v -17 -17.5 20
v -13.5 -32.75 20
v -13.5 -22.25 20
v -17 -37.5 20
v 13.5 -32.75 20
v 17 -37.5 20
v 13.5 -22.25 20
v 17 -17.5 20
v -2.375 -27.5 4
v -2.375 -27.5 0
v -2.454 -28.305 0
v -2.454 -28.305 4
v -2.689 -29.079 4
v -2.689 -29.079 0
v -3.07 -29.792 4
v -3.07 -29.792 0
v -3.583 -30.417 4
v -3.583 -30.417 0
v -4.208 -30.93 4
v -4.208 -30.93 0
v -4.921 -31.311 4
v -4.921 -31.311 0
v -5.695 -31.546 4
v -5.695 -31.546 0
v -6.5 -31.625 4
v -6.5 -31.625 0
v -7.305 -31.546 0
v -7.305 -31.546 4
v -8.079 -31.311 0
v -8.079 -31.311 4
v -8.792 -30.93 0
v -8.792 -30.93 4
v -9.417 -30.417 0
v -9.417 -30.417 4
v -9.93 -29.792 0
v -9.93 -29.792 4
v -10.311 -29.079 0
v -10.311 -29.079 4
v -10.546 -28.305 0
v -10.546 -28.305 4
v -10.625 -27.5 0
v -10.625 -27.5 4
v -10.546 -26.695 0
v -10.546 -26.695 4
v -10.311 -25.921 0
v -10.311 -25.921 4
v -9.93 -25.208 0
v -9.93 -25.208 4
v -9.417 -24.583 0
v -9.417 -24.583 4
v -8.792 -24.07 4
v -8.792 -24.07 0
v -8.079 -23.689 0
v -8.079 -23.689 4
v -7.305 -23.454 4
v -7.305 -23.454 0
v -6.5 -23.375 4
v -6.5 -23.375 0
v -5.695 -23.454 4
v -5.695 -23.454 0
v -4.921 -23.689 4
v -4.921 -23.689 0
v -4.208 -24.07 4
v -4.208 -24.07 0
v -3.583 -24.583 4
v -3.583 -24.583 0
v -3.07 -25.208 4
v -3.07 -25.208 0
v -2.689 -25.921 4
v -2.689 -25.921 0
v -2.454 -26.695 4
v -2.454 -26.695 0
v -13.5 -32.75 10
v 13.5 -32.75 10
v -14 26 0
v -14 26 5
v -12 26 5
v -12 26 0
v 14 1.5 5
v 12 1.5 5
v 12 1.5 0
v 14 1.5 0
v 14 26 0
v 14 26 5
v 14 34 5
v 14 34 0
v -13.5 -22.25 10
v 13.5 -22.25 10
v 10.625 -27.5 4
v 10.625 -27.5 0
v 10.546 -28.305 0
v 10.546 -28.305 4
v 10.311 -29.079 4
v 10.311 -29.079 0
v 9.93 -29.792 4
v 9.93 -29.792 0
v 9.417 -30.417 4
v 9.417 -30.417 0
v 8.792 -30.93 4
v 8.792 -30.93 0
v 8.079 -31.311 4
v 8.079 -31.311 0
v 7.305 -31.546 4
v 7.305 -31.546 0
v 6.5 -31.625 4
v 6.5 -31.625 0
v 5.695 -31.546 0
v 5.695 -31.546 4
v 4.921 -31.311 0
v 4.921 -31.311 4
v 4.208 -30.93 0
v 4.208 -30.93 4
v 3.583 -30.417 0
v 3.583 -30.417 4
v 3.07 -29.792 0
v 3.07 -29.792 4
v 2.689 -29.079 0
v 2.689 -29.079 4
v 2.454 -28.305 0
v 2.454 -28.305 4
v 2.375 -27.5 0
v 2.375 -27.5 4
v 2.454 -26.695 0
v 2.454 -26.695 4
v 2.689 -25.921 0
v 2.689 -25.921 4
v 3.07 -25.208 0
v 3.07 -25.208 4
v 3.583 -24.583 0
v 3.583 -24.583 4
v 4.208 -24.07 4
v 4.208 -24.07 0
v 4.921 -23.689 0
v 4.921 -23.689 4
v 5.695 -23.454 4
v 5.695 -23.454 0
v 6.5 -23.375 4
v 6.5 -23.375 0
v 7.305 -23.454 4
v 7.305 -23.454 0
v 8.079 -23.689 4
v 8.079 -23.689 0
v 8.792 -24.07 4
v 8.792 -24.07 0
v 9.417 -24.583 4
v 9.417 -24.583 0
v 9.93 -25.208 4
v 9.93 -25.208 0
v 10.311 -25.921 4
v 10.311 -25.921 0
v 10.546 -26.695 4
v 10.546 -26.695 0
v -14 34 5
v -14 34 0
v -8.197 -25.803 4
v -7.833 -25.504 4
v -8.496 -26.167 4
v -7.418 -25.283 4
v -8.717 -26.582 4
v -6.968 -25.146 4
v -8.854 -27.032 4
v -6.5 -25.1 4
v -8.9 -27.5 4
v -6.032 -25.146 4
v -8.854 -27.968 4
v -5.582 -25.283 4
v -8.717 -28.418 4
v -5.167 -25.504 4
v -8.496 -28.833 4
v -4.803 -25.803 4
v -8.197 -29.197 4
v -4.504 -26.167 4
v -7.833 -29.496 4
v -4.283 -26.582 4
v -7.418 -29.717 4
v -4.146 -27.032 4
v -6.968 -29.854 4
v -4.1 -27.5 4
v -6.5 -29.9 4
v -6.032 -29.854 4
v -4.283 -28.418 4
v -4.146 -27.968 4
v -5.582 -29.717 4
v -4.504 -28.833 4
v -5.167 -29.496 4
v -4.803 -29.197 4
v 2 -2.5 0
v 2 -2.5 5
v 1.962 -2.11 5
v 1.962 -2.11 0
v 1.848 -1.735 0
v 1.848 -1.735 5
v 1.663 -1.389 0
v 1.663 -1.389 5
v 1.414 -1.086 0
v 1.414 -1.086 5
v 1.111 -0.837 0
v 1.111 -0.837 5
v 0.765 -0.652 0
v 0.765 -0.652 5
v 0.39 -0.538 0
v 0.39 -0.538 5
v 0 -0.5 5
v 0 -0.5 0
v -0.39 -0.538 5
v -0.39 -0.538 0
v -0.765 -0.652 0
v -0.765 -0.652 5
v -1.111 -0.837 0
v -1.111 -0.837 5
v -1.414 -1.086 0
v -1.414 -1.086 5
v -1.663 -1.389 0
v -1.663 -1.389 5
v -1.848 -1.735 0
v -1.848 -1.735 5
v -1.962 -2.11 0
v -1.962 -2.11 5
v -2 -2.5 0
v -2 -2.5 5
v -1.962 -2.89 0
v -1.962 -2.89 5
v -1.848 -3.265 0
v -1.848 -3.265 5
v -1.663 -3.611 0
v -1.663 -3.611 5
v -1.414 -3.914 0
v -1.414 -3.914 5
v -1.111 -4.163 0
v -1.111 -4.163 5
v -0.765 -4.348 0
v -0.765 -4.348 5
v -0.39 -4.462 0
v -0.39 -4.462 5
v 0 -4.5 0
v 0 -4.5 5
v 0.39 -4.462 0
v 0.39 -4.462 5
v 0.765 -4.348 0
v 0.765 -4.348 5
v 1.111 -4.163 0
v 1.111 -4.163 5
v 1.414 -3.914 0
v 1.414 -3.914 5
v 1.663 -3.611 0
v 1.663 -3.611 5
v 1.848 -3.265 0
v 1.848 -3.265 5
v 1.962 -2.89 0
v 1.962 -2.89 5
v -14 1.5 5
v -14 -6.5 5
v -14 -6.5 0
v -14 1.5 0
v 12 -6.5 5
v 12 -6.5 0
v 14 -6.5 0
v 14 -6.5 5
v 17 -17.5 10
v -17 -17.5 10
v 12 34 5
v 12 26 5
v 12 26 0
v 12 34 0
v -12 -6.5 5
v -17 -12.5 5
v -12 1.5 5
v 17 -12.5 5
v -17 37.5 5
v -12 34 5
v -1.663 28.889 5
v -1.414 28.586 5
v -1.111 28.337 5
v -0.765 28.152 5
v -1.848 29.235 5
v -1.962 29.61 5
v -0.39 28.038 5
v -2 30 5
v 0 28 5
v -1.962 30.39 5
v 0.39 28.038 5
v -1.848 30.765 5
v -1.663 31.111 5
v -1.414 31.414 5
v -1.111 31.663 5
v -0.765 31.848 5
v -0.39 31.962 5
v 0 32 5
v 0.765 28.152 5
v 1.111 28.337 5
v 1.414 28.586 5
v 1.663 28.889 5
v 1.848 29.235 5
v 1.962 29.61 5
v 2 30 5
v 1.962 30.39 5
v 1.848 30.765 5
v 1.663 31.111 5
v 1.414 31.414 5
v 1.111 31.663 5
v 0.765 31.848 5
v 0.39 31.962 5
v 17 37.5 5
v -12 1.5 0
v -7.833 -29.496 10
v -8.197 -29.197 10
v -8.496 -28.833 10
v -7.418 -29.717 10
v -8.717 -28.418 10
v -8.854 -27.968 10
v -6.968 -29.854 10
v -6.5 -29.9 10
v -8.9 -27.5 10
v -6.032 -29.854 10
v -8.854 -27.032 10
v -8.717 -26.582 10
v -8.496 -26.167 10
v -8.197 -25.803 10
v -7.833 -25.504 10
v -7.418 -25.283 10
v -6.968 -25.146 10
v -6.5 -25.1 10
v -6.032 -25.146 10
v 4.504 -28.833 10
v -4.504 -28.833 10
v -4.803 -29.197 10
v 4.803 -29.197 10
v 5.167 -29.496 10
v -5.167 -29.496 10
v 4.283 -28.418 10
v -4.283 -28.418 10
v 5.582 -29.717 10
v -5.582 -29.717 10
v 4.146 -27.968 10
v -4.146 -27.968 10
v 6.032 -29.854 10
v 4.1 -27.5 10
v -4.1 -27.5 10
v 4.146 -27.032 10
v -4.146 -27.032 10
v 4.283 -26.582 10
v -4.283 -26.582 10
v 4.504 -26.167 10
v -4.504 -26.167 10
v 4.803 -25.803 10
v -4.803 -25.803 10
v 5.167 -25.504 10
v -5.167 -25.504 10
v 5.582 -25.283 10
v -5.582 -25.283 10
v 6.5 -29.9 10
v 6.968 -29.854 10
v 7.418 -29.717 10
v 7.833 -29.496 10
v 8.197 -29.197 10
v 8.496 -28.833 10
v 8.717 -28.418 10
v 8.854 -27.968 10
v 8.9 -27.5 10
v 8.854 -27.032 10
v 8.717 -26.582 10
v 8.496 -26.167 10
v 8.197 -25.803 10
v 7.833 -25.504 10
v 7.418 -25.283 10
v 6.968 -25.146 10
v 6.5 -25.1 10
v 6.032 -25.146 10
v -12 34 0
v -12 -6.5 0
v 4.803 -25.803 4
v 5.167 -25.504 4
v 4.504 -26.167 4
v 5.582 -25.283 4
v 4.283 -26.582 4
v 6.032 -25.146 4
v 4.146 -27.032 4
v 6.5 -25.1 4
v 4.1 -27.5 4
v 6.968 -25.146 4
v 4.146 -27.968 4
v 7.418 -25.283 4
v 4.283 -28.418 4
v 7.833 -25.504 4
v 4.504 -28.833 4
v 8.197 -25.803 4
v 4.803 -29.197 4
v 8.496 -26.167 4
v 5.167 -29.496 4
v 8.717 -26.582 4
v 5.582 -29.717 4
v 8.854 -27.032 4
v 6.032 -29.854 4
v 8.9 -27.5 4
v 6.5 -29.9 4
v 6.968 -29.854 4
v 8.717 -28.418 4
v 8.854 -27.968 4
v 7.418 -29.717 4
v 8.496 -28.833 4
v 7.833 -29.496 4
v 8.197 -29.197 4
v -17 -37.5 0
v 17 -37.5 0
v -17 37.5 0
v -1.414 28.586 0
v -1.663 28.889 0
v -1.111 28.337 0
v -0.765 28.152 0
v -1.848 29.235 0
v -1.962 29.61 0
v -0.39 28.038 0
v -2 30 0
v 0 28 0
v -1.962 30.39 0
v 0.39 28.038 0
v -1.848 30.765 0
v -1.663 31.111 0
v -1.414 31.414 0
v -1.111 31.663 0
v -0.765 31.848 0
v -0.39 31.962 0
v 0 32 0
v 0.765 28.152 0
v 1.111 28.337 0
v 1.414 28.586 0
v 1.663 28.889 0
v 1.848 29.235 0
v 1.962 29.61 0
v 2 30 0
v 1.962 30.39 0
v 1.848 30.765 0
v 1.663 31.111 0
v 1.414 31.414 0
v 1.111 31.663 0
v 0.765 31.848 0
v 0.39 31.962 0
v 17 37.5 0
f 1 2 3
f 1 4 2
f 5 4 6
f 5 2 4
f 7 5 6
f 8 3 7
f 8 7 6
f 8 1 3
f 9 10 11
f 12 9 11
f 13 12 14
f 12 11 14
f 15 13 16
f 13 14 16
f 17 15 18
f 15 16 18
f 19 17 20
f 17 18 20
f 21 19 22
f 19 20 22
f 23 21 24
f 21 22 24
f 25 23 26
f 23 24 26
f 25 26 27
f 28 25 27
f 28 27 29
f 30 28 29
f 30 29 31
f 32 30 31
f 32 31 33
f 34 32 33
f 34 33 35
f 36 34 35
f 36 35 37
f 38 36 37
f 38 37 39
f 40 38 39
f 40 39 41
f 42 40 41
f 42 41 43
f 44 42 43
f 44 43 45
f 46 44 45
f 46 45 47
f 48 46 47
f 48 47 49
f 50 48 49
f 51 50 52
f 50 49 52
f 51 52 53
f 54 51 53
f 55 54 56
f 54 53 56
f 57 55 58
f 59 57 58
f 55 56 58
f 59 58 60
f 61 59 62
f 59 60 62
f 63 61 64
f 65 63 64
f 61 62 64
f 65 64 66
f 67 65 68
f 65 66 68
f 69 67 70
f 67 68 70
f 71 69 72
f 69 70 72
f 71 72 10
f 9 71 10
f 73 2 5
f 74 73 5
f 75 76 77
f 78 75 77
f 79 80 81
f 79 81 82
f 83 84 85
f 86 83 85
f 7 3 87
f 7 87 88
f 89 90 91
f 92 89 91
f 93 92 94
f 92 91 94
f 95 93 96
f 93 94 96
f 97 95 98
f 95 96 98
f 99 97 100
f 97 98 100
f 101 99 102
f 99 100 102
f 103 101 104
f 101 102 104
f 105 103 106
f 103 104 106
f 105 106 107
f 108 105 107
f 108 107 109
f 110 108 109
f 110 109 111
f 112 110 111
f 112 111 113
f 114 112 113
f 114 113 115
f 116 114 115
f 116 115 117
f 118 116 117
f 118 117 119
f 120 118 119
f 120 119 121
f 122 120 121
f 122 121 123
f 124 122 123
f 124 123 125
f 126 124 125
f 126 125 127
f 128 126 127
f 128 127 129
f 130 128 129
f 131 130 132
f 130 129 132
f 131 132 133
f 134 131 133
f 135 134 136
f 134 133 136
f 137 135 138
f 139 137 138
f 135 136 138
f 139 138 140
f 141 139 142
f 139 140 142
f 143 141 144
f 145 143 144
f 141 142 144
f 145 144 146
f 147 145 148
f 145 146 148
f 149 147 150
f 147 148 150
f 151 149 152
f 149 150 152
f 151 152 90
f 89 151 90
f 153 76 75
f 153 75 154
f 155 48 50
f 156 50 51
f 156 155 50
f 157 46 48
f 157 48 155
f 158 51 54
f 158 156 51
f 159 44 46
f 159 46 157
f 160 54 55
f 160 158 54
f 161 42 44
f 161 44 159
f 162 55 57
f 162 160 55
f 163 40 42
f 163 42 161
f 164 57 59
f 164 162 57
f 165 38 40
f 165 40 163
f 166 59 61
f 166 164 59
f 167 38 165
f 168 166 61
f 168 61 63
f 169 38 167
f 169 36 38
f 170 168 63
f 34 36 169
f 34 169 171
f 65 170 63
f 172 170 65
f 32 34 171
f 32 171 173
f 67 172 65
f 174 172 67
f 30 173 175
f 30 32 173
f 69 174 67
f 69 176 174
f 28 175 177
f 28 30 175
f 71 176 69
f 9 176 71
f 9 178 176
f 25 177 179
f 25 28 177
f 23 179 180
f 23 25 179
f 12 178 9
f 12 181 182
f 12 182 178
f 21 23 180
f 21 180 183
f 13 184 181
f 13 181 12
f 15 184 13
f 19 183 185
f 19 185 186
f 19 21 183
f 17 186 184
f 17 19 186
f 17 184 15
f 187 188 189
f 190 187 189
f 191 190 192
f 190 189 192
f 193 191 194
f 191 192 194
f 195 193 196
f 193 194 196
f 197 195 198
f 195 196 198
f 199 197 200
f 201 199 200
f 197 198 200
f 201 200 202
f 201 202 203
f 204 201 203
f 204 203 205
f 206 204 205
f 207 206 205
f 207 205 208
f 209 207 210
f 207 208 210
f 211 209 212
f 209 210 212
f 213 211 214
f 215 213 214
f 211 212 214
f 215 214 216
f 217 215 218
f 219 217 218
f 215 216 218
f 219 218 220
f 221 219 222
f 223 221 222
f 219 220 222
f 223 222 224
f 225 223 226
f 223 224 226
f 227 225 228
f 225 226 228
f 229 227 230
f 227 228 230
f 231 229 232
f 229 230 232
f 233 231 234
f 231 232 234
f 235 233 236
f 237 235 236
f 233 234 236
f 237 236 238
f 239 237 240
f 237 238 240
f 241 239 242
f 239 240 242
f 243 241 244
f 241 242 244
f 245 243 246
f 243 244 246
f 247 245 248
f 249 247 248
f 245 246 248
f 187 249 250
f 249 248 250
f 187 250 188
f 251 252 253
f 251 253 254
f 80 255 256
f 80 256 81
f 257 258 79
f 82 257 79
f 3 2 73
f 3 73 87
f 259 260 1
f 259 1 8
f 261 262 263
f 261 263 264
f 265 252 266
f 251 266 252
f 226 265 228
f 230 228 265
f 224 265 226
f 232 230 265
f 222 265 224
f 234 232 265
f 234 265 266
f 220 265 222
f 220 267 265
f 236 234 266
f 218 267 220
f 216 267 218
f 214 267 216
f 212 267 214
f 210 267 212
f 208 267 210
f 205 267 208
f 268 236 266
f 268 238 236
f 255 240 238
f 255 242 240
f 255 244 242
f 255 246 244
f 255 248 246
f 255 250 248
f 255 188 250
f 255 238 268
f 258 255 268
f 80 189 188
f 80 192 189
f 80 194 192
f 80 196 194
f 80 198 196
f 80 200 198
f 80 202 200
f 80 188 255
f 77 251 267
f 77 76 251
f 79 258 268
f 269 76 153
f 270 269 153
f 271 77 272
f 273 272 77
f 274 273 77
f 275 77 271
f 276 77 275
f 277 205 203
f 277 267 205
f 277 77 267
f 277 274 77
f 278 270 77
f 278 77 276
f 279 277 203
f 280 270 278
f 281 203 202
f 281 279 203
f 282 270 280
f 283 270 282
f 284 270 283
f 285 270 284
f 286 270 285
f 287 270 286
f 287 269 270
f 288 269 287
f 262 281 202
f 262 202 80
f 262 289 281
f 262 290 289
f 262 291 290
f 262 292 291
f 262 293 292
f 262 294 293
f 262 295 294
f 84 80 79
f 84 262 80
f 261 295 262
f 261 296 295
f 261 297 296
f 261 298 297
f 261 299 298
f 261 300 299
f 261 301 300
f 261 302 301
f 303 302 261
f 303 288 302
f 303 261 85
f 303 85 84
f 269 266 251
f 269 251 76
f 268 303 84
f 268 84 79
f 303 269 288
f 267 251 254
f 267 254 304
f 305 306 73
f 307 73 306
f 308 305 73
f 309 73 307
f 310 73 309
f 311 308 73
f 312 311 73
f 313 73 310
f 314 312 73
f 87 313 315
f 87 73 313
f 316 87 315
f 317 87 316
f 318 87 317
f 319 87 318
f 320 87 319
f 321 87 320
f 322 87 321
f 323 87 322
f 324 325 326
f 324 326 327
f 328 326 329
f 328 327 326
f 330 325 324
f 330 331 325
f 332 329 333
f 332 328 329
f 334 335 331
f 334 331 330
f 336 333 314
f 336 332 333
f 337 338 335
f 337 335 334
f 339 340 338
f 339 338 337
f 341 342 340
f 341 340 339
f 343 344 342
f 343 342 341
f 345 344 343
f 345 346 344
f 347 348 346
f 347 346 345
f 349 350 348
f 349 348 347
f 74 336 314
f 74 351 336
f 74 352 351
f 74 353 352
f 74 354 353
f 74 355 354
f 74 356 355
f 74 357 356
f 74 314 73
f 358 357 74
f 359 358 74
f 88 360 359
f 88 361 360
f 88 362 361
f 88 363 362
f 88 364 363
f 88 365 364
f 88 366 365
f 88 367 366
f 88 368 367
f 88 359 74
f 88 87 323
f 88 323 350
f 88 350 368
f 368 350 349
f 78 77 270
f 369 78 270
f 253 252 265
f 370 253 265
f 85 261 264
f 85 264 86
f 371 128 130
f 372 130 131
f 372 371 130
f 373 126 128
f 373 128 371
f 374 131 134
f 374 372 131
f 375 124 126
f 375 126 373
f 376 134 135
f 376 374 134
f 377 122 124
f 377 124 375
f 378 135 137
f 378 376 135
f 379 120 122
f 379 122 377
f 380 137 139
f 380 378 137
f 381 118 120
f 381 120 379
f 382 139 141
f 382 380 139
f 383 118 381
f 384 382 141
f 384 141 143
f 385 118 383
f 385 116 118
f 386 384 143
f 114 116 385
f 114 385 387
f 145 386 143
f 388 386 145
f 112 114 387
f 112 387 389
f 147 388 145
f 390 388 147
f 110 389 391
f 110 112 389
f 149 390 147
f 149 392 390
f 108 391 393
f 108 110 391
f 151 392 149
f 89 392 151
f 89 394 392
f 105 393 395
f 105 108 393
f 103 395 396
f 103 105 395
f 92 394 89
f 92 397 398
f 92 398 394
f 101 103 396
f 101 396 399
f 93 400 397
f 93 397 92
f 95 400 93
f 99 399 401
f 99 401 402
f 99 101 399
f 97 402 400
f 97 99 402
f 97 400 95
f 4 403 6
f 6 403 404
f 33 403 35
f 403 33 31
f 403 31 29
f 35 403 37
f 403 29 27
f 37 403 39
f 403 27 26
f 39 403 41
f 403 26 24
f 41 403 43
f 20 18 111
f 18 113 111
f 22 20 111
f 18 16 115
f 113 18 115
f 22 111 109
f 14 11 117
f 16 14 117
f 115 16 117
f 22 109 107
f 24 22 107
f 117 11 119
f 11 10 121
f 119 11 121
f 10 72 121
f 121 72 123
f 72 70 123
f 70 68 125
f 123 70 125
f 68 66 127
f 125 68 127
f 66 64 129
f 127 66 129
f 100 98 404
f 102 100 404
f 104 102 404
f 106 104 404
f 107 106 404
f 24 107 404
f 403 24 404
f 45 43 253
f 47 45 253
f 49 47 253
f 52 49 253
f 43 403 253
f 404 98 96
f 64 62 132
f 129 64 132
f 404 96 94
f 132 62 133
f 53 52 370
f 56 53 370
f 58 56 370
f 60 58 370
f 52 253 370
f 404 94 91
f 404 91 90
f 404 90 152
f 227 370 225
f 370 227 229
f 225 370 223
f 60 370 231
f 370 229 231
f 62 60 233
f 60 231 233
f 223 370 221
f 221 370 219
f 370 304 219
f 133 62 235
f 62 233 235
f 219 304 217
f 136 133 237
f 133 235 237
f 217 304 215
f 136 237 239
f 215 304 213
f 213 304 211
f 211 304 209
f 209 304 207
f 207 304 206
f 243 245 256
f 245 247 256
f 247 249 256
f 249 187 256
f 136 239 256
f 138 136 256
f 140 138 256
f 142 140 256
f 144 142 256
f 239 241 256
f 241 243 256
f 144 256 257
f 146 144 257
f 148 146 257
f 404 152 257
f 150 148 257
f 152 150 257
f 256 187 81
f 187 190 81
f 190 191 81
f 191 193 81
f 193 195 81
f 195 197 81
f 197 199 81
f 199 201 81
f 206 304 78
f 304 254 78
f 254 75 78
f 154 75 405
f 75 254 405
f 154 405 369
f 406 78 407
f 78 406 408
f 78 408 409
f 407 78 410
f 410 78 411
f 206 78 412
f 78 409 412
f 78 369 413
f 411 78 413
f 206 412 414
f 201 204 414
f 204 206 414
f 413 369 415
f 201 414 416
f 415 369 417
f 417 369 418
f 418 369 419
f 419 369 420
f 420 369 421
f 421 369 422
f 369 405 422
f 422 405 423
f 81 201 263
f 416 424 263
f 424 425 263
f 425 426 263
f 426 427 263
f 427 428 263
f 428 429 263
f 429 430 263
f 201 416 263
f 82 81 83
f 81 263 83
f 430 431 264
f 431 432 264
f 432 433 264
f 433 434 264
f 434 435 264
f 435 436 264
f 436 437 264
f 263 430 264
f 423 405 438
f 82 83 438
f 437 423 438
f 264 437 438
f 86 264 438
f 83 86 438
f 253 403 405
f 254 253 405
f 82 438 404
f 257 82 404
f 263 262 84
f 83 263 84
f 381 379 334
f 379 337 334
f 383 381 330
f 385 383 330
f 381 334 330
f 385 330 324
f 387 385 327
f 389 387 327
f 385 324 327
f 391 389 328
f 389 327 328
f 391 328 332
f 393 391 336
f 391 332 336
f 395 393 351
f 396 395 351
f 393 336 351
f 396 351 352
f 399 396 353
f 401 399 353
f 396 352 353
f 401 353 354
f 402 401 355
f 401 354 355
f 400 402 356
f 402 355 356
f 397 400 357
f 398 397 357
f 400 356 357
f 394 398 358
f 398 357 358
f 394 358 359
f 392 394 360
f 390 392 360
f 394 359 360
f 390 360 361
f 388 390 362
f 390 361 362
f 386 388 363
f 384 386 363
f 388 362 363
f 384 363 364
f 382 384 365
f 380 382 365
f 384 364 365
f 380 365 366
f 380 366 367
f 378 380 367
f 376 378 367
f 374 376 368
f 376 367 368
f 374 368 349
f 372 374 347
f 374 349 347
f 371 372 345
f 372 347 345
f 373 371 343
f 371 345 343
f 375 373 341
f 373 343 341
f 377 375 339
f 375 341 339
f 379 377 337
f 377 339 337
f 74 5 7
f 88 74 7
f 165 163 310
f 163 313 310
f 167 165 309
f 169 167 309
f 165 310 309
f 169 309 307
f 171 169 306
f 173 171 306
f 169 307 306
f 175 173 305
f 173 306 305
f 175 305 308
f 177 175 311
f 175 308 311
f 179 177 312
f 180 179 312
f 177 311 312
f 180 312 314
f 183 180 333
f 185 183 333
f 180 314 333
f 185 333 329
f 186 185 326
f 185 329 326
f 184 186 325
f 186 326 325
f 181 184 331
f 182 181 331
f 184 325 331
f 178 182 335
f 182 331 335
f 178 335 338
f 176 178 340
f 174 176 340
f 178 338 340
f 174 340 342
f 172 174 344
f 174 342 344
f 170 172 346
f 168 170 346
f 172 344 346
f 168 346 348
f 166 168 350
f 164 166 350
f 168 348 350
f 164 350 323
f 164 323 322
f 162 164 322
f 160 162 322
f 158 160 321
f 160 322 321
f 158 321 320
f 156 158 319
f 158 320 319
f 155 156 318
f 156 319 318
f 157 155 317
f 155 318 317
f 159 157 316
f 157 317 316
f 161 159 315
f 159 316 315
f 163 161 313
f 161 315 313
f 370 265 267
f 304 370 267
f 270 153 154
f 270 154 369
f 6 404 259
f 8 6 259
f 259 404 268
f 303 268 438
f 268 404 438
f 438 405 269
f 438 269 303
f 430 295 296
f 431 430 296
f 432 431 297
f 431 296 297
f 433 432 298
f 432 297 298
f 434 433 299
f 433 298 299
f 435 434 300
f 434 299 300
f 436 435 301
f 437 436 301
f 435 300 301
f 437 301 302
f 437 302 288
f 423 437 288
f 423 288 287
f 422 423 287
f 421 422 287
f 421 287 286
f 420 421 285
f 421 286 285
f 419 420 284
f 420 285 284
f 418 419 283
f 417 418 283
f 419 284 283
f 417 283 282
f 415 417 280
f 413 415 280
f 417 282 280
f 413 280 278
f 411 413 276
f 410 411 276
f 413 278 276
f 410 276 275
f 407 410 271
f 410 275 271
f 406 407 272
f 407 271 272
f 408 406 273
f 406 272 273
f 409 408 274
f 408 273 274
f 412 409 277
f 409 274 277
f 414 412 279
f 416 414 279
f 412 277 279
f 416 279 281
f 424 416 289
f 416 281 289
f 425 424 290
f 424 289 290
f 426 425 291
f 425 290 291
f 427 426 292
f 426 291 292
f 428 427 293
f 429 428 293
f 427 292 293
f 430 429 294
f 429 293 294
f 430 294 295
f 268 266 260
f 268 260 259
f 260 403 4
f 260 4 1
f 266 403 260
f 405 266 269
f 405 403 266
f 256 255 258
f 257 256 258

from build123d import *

# Parameters (mm, degrees)
SKETCH_W         = 34
SKETCH_H         = 75
PAD_DEPTH        = 5
SKETCH001_W      = 34
SKETCH001_H      = 20
PAD001_DEPTH     = 15
SKETCH002_W      = 27
SKETCH002_H      = 10.5
POCKET_DEPTH     = 10
HOLE_D           = 4.8
HOLE_DEPTH       = 25
HOLE_CBORE_D     = 8.25
HOLE_CBORE_DEPTH = 4
SKETCH004_R      = 2
SKETCH004_W      = 2
SKETCH004_H      = 8
POCKET001_DEPTH  = 5
CHAMFER_SIZE     = 5


with BuildPart() as part:
    # Sketch → Pad (new body)
    with BuildSketch(Plane.XY):
        Rectangle(SKETCH_W, SKETCH_H)
    extrude(amount=PAD_DEPTH)

    # Sketch001 (on Face6 of Pad) → Pad001 (join)
    with BuildSketch(Plane.XY.offset(5)):
        with Locations((0, -27.5)):
            Rectangle(SKETCH001_W, SKETCH001_H)
    extrude(amount=PAD001_DEPTH)

    # Sketch002 (on Face10 of Pad001) → Pocket (cut)
    with BuildSketch(Plane.XY.offset(20)):
        with Locations((0, -27.5)):
            Rectangle(SKETCH002_W, SKETCH002_H)
    extrude(amount=-POCKET_DEPTH, mode=Mode.SUBTRACT)

    # Hole
    with Locations(Plane(origin=(0, 0, 0), x_dir=(1, 0, 0), z_dir=(0, 0, -1))):
        with Locations((-6.5, 27.5), (6.5, 27.5)):
            CounterBoreHole(HOLE_D / 2, HOLE_CBORE_D / 2, HOLE_CBORE_DEPTH, depth=HOLE_DEPTH)

    # Sketch004 (on Face5 of Hole) → Pocket001 (cut)
    with BuildSketch(Plane.XY.offset(5)):
        with Locations((0, 30)):
            Circle(SKETCH004_R)
        with Locations((0, -2.5)):
            Circle(SKETCH004_R)
        with Locations((-13, 30)):
            Rectangle(SKETCH004_W, SKETCH004_H)
        with Locations((13, 30)):
            Rectangle(SKETCH004_W, SKETCH004_H)
        with Locations((-13, -2.5)):
            Rectangle(SKETCH004_W, SKETCH004_H)
        with Locations((13, -2.5)):
            Rectangle(SKETCH004_W, SKETCH004_H)
    extrude(amount=-POCKET001_DEPTH, mode=Mode.SUBTRACT)

    # Chamfer
    chamfer_edges = [part.edges().sort_by_distance(p)[0] for p in [
        (0, -17.5, 5),
    ]]
    chamfer(chamfer_edges, length=CHAMFER_SIZE)


solid = part.part
